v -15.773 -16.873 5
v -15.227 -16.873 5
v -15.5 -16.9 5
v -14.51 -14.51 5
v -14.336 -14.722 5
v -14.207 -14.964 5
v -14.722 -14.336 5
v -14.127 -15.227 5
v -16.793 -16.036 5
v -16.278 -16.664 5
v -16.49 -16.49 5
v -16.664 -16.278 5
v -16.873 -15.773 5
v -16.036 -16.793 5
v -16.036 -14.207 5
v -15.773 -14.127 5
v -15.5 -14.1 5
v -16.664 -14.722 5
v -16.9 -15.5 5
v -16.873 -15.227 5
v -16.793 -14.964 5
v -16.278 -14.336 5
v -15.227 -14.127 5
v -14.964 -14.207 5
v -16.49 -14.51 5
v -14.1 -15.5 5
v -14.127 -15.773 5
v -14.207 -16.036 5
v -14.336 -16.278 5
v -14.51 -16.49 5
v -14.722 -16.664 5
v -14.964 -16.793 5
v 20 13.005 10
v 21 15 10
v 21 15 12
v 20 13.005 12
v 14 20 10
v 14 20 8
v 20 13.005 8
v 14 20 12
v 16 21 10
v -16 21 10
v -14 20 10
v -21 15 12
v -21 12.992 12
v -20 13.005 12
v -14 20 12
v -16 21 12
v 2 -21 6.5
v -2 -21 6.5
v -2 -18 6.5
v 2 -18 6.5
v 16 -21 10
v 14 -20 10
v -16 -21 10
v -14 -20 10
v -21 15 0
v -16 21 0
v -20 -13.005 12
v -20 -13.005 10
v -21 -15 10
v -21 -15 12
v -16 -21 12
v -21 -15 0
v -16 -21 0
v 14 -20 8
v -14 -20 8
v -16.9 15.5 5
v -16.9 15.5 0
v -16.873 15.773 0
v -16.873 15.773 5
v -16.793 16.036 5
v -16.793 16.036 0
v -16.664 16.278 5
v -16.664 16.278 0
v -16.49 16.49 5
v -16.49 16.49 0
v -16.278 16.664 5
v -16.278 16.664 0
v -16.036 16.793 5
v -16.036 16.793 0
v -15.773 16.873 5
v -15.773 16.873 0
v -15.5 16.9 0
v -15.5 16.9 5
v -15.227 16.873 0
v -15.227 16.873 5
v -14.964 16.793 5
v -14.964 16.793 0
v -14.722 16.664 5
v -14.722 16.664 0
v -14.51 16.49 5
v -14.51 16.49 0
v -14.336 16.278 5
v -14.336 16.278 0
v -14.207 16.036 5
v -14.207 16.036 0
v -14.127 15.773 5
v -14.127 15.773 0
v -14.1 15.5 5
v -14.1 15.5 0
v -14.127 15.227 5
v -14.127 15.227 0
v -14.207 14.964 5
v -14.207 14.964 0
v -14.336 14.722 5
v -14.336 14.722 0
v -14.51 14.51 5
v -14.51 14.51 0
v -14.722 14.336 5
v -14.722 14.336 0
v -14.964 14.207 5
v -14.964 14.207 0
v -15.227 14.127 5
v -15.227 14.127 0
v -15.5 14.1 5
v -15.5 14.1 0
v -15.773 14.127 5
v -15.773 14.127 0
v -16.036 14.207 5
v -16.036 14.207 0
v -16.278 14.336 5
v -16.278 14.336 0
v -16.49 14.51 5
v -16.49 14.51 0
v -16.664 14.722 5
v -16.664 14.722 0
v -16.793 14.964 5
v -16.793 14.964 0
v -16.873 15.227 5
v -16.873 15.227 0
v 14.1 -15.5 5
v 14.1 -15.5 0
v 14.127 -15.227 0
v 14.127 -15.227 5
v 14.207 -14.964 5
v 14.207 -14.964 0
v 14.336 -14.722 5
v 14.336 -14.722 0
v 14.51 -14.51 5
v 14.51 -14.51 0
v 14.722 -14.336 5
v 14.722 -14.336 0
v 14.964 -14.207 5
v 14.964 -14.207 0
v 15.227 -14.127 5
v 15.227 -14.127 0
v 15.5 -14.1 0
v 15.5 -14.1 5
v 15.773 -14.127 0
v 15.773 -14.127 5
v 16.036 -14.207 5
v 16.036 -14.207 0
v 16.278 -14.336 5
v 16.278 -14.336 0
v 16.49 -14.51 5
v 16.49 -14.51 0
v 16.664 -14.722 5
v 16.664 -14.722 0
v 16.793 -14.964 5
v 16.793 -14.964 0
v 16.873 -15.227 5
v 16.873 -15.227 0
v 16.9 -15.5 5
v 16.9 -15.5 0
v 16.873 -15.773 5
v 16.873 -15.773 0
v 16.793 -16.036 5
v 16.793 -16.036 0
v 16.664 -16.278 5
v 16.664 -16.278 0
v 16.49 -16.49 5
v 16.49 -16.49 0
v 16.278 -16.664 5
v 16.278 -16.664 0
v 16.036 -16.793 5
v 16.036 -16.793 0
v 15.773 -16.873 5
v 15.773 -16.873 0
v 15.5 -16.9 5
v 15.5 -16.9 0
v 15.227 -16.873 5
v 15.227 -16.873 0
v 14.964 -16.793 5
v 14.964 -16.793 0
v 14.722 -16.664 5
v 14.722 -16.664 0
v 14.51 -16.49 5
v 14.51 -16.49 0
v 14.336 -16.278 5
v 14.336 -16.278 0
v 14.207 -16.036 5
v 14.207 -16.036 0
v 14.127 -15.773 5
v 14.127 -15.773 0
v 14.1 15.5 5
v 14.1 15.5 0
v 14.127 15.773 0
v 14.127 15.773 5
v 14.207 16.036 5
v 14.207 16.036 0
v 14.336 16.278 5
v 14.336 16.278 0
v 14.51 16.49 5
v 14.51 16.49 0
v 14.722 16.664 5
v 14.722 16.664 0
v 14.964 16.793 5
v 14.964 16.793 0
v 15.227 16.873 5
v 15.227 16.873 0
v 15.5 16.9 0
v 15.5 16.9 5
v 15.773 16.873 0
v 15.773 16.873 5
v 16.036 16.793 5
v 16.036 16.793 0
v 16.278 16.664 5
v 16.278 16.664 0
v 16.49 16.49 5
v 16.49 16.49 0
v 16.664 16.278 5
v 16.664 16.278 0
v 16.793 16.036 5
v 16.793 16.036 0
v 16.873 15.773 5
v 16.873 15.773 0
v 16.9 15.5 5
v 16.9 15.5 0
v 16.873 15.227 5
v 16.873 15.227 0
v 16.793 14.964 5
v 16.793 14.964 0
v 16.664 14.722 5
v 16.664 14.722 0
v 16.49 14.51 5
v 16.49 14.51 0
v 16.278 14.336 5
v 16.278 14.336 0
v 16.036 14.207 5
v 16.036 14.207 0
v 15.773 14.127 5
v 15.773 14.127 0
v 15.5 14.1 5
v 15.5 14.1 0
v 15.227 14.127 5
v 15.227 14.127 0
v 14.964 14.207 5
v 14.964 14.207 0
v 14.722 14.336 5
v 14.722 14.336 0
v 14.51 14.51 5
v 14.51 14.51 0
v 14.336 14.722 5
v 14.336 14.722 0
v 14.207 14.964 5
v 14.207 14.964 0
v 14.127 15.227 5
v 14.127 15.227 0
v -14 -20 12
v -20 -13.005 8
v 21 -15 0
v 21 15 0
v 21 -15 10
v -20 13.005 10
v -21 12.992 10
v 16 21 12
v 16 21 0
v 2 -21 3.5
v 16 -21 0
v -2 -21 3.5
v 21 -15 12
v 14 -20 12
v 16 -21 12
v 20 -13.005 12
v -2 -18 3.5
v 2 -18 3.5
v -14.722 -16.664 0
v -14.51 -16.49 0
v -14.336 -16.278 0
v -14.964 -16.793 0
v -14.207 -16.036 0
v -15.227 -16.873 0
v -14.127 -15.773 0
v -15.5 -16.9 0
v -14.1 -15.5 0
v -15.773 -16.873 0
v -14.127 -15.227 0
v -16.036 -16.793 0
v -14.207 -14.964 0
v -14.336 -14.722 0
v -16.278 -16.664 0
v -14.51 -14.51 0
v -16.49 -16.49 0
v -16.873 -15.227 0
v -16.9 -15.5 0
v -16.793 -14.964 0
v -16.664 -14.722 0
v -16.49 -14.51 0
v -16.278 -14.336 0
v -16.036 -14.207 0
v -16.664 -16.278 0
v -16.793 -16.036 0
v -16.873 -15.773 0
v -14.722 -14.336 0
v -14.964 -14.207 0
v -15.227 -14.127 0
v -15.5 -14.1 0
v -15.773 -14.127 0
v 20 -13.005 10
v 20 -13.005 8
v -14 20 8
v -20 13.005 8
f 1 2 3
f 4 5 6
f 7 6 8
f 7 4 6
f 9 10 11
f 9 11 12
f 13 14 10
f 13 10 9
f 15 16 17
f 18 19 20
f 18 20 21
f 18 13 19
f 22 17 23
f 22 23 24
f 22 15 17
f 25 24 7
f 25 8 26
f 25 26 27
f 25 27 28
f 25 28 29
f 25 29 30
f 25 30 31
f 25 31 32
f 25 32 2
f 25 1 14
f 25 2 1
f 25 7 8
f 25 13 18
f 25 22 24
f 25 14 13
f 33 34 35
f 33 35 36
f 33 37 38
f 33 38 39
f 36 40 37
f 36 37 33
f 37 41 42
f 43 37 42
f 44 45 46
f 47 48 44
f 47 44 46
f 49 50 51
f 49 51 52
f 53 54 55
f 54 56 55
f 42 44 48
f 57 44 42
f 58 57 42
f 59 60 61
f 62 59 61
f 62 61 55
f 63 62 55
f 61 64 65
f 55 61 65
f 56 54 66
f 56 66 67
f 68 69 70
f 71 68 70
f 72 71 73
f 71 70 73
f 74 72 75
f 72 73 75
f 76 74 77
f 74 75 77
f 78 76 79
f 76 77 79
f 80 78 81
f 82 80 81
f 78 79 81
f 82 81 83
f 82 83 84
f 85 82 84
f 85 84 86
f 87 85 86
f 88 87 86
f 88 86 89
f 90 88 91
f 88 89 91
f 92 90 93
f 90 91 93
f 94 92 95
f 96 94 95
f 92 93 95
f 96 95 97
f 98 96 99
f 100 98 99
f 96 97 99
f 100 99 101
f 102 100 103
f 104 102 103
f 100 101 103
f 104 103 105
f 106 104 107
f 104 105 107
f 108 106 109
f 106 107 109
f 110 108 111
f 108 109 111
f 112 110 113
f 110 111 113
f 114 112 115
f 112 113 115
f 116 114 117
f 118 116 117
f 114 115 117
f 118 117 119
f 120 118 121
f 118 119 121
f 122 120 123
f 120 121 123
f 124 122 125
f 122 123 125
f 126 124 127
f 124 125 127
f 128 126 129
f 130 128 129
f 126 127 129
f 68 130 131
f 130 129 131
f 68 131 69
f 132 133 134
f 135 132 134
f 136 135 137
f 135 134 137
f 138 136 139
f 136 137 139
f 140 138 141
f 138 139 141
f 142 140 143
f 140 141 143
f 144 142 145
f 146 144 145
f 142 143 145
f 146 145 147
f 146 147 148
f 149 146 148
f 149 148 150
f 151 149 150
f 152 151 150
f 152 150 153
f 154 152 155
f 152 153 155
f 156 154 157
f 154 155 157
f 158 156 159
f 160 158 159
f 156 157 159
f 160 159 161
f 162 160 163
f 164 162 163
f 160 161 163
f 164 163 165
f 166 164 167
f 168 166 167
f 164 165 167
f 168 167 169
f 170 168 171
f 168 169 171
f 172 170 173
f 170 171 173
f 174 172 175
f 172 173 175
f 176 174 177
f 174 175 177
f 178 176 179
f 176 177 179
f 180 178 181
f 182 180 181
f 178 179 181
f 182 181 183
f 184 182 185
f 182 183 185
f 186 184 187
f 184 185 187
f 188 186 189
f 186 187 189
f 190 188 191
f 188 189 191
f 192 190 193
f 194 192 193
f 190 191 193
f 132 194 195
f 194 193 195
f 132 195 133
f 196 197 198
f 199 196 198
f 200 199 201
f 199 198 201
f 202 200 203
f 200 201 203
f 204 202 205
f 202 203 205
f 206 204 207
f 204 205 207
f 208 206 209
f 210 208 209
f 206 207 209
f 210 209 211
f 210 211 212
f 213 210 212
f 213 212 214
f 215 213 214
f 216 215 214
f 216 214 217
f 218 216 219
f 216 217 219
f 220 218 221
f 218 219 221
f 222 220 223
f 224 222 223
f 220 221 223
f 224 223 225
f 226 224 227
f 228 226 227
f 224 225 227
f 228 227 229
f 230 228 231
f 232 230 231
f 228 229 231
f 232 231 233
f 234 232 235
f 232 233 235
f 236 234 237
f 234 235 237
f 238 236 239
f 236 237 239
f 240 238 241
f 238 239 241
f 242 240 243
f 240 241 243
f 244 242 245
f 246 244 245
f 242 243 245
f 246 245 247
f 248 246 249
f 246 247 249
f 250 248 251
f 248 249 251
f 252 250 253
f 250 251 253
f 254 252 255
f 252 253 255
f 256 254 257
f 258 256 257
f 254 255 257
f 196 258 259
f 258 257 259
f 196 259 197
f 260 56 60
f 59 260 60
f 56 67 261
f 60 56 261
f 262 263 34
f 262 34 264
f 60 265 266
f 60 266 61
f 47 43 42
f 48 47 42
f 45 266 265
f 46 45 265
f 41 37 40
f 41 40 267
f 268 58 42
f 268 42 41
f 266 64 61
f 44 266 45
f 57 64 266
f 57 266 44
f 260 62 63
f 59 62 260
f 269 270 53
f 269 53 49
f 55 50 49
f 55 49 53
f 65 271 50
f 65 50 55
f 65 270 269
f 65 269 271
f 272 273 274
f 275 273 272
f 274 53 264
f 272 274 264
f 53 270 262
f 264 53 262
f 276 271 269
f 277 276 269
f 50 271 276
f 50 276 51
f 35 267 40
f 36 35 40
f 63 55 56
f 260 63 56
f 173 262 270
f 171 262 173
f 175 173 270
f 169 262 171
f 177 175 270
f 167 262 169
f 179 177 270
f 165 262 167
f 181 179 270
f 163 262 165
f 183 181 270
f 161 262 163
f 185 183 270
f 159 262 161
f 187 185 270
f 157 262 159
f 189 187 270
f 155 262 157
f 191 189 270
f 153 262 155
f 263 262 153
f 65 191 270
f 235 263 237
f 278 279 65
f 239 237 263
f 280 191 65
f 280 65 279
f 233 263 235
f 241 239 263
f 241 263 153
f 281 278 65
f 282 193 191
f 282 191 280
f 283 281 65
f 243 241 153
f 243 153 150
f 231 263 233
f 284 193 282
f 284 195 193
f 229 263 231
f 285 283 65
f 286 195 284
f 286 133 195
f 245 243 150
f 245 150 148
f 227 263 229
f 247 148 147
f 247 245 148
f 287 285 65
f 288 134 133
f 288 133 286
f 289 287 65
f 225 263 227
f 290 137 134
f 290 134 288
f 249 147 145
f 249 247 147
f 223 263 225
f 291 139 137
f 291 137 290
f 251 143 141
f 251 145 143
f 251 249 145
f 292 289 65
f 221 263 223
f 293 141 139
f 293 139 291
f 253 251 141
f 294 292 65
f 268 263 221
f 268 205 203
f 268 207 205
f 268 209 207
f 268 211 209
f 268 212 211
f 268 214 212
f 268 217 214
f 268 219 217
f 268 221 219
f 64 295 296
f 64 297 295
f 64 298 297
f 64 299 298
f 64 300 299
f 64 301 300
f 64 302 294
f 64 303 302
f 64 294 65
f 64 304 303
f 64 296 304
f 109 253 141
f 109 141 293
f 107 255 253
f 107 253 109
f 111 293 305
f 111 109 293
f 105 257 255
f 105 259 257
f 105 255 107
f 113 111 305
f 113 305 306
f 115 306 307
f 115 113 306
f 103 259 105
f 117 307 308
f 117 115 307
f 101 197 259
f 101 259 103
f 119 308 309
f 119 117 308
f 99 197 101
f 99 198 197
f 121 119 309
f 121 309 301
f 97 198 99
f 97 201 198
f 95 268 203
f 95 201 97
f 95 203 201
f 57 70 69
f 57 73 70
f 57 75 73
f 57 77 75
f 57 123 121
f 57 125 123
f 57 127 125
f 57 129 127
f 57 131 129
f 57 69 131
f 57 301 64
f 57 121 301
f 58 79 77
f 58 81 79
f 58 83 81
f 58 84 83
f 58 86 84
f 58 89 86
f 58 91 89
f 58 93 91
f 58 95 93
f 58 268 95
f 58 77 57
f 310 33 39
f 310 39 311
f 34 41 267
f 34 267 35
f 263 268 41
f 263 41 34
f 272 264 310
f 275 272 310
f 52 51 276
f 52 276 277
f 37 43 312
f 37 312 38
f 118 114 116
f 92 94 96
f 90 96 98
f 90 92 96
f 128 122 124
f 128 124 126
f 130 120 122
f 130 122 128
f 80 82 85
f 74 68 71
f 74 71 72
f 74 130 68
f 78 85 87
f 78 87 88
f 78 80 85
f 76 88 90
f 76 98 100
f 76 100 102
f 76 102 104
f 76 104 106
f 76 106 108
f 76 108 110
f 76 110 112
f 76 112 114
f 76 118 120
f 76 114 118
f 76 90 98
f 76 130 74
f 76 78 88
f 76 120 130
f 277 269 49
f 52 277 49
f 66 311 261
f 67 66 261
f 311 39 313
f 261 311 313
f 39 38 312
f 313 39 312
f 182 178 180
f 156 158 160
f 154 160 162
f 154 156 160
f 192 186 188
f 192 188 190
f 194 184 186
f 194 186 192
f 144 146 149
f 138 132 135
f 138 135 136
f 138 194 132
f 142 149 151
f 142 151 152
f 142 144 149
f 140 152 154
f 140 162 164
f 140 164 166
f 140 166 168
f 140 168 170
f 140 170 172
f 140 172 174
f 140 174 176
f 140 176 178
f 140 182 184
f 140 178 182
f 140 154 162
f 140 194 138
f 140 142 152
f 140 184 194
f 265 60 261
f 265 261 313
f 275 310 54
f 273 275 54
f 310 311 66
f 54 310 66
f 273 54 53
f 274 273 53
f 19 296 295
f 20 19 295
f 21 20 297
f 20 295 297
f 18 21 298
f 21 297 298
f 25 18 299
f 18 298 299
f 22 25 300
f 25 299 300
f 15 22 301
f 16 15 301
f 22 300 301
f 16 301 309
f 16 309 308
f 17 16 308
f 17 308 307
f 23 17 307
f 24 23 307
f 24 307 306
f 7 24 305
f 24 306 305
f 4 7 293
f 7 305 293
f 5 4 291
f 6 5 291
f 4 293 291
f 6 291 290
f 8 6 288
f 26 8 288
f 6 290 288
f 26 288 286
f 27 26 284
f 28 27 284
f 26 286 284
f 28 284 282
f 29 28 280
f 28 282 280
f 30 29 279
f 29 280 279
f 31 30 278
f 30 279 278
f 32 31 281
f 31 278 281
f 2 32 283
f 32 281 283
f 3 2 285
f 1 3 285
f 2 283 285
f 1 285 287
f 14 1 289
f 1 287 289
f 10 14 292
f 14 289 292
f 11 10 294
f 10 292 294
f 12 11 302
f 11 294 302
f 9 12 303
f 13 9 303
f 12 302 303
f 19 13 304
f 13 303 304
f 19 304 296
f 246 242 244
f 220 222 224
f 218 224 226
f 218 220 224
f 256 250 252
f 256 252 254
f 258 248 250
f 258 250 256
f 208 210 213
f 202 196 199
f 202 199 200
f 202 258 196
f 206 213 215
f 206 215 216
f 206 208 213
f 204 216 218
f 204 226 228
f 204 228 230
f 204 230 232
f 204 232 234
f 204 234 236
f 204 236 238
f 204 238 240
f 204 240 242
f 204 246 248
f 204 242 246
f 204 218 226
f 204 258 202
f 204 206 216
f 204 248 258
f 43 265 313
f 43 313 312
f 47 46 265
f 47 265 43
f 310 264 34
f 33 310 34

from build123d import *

# Parameters (mm, degrees)
SALIENTE_EXTRUIR1_DEPTH = 10
CORTAR_EXTRUIR1_DEPTH   = 2
SALIENTE_EXTRUIR2_DEPTH = 2
CROQUIS5_W              = 4
CROQUIS5_H              = 3
CORTAR_EXTRUIR2_DEPTH   = 3
CROQUIS6_R              = 1.4
CORTAR_EXTRUIR3_DEPTH   = 5


with BuildPart() as part:
    # Croquis2 → Saliente-Extruir1 (new body)
    with BuildSketch(Plane.XY):
        Polygon((-16, 21), (16, 21), (21, 15), (21, -15), (16, -21), (-16, -21), (-21, -15), (-21, 15), align=None)
    extrude(amount=SALIENTE_EXTRUIR1_DEPTH)

    # Croquis3 → Cortar-Extruir1 (cut)
    with BuildSketch(Plane.XY.offset(10)):
        Polygon((-14, 20), (14, 20), (20, 13.004934109), (20, -13.004934109), (14, -20), (-14, -20), (-20, -13.004934109), (-20, 13.004934109), align=None)
    extrude(amount=-CORTAR_EXTRUIR1_DEPTH, mode=Mode.SUBTRACT)

    # Croquis4 → Saliente-Extruir2 (add)
    with BuildSketch(Plane.XY.offset(10)):
        Polygon((-16, -21), (-14, -20), (-20, -13.004934109), (-21, -15), align=None)
        Polygon((-20, 13.004934109), (-14, 20), (-16, 21), (-21, 15), (-21, 12.992008233), align=None)
        Polygon((16, 21), (21, 15), (20, 13.004934109), (14, 20), align=None)
        Polygon((16, -21), (21, -15), (20, -13.004934109), (14, -20), align=None)
    extrude(amount=SALIENTE_EXTRUIR2_DEPTH)

    # Croquis5 → Cortar-Extruir2 (cut)
    with BuildSketch(Plane.XZ.offset(21)):
        with Locations((0, 5)):
            Rectangle(CROQUIS5_W, CROQUIS5_H)
    extrude(amount=-CORTAR_EXTRUIR2_DEPTH, mode=Mode.SUBTRACT)

    # Croquis6 → Cortar-Extruir3 (cut)
    with BuildSketch(Plane(origin=(0, 0, 0), x_dir=(-1, 0, 0), z_dir=(0, 0, -1))):
        with Locations((15.5, 15.5)):
            Circle(CROQUIS6_R)
        with Locations((-15.5, 15.5)):
            Circle(CROQUIS6_R)
        with Locations((15.5, -15.5)):
            Circle(CROQUIS6_R)
        with Locations((-15.5, -15.5)):
            Circle(CROQUIS6_R)
    extrude(amount=-CORTAR_EXTRUIR3_DEPTH, mode=Mode.SUBTRACT)


solid = part.part
